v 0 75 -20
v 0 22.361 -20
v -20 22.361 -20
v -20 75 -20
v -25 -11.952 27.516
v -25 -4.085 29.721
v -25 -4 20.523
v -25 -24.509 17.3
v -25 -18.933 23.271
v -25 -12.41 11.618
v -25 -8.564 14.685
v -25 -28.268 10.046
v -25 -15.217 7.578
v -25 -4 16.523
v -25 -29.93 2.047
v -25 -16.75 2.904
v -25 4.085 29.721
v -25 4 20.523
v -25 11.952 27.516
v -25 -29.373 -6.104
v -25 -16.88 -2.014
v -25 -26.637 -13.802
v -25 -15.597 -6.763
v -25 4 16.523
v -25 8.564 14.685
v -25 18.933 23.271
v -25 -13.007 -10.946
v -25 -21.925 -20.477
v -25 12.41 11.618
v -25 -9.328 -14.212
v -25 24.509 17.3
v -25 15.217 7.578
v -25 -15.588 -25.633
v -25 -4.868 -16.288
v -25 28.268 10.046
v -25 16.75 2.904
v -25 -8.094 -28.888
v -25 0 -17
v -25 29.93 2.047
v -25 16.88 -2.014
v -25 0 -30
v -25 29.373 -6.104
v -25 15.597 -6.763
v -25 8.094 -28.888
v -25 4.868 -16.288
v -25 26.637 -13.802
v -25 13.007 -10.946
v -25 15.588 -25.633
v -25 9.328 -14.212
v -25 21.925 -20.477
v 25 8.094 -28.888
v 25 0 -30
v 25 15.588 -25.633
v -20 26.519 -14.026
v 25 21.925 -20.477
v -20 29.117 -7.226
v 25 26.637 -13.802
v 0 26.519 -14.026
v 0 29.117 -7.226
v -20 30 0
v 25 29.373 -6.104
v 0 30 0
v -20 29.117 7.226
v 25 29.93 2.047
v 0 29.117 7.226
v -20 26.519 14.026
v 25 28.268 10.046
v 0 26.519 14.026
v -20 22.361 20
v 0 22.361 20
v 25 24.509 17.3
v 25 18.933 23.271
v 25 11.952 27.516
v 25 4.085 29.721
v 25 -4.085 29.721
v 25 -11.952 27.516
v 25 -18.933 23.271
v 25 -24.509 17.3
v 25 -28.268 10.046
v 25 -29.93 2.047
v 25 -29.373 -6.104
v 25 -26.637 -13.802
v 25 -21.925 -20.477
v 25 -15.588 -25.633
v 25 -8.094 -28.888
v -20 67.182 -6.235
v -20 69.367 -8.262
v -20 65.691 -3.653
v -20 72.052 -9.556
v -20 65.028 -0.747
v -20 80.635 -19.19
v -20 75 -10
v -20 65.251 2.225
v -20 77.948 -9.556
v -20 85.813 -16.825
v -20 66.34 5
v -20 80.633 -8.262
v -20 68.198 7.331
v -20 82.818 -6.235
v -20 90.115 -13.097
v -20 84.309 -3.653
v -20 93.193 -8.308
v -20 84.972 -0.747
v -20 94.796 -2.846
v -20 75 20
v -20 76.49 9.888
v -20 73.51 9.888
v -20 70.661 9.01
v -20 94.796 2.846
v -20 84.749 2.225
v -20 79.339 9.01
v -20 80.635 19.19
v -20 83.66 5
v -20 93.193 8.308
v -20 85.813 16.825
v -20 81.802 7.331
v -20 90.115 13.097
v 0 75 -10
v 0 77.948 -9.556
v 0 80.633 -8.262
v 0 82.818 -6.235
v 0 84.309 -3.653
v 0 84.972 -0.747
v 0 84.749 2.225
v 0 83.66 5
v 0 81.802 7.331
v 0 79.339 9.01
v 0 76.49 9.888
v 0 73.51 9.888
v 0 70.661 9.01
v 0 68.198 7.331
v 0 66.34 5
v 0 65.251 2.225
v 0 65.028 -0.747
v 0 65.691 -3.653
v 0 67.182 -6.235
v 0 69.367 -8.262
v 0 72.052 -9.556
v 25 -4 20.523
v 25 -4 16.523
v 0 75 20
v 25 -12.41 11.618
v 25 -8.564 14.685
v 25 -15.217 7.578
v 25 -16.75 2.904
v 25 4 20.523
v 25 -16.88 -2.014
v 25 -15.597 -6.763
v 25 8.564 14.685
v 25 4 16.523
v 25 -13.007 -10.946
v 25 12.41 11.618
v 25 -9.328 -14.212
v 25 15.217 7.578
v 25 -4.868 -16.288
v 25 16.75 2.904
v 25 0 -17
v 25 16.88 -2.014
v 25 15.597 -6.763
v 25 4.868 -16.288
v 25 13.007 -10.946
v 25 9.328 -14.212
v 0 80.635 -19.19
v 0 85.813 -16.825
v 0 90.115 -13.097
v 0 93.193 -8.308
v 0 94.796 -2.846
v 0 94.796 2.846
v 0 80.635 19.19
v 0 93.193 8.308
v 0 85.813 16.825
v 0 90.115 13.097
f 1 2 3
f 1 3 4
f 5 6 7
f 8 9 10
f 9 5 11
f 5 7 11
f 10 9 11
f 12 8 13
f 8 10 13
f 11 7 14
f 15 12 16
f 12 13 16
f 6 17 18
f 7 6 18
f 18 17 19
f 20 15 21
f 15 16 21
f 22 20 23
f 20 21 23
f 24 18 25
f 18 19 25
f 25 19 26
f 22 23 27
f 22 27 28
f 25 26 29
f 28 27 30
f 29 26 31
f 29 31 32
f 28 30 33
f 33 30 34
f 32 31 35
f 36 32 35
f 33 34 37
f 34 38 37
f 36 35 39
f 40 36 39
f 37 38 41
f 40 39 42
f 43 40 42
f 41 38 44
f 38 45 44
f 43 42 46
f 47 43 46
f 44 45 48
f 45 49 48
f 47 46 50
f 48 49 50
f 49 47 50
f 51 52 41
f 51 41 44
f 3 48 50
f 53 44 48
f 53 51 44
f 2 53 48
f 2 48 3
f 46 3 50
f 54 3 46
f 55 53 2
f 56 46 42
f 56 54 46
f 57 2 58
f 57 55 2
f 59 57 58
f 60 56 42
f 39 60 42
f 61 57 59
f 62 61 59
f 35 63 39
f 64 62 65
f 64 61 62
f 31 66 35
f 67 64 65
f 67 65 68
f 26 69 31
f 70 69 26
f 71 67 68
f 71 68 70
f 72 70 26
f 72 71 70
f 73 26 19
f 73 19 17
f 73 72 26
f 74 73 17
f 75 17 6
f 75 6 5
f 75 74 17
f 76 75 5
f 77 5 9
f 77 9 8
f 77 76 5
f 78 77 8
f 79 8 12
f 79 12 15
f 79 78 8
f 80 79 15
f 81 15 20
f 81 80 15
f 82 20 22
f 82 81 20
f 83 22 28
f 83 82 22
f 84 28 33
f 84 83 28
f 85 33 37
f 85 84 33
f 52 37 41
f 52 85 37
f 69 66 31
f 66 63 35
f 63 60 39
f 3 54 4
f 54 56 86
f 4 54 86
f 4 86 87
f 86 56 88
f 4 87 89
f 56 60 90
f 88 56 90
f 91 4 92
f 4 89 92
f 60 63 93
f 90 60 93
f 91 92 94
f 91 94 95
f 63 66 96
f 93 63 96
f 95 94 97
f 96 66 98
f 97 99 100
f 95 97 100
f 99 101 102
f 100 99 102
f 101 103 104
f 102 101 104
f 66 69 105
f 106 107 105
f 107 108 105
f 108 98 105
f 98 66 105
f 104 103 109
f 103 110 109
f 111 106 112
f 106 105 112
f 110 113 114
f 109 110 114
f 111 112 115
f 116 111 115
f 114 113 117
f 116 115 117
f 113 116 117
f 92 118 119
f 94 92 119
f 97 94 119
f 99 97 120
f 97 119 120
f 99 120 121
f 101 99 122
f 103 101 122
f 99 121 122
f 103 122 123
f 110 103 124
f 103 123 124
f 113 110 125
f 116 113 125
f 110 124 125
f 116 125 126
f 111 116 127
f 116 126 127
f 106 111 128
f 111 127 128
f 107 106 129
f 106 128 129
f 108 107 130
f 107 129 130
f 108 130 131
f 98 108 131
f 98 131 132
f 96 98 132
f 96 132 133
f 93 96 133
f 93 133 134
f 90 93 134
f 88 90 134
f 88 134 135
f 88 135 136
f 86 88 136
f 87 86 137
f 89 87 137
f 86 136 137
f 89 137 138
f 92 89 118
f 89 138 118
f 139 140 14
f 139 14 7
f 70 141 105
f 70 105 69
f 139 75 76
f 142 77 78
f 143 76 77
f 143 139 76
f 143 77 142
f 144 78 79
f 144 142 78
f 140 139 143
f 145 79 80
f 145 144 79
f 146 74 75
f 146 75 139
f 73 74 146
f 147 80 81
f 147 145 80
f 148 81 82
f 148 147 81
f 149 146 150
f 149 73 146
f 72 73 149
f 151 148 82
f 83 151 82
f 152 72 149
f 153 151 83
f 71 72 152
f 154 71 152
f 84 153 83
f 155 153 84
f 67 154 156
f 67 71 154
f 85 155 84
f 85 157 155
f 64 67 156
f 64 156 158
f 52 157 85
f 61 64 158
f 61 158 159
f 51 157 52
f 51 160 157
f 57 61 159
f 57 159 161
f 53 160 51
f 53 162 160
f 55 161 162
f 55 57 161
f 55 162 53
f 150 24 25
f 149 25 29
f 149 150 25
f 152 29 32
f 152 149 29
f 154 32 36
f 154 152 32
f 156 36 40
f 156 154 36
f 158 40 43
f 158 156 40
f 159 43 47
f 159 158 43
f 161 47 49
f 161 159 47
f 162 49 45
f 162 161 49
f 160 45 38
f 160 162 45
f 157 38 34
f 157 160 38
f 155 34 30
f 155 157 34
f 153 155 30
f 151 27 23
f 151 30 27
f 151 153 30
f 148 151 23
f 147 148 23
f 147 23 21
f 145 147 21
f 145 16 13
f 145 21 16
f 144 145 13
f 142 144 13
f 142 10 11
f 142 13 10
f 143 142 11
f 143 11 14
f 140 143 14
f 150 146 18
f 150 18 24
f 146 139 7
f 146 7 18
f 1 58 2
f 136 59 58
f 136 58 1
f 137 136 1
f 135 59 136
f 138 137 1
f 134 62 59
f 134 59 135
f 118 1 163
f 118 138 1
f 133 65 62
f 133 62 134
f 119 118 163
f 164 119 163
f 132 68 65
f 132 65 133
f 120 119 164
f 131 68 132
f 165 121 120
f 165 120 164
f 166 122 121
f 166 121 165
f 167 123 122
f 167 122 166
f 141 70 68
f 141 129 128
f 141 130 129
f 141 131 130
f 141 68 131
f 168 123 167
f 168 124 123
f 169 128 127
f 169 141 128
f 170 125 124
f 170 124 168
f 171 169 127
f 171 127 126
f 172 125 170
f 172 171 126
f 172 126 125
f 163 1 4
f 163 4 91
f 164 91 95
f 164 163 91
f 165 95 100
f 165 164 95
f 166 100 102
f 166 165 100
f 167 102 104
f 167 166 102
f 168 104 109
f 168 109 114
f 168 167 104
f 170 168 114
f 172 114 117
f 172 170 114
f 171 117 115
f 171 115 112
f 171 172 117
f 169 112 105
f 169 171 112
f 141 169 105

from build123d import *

# Parameters (mm, degrees)
BOSS_EXTRUDE2_DEPTH = 25
SKETCH1_3_R         = 10
BOSS_EXTRUDE3_DEPTH = 20
CUT_EXTRUDE2_DEPTH  = 112.467484048


with BuildPart() as part:
    # Sketch1 → Boss-Extrude2 (new, symmetric)
    with BuildSketch(Plane.YZ):
        with BuildLine():
            ThreePointArc((30, 0), (28.025170769, 10.704662693), (22.360679775, 20))
            ThreePointArc((22.360679775, 20), (-30, 0), (22.360679775, -20))
            ThreePointArc((22.360679775, -20), (28.025170769, -10.704662693), (30, 0))
        make_face()
    extrude(amount=BOSS_EXTRUDE2_DEPTH, both=True)

    # Sketch1<3> → Boss-Extrude3 (add)
    with BuildSketch(Plane.YZ):
        with BuildLine():
            ThreePointArc((75, -20), (95, 0), (75, 20))
            Line((75, 20), (22.360679775, 20))
            ThreePointArc((22.360679775, 20), (28.025170769, 10.704662693), (30, 0))
            ThreePointArc((30, 0), (28.025170769, -10.704662693), (22.360679775, -20))
            Line((22.360679775, -20), (75, -20))
        make_face()
        with Locations((75, 0)):
            Circle(SKETCH1_3_R, mode=Mode.SUBTRACT)
    extrude(amount=-BOSS_EXTRUDE3_DEPTH)

    # Sketch3 → Cut-Extrude2 (cut, through all)
    with BuildSketch(Plane.YZ.offset(25)):
        with BuildLine():
            Line((-4, 20.522711642), (4, 20.522711642))
            Line((4, 20.522711642), (4, 16.522711642))
            ThreePointArc((4, 16.522711642), (0, -17), (-4, 16.522711642))
            Line((-4, 16.522711642), (-4, 20.522711642))
        make_face()
    extrude(amount=-CUT_EXTRUDE2_DEPTH, mode=Mode.SUBTRACT)


solid = part.part
